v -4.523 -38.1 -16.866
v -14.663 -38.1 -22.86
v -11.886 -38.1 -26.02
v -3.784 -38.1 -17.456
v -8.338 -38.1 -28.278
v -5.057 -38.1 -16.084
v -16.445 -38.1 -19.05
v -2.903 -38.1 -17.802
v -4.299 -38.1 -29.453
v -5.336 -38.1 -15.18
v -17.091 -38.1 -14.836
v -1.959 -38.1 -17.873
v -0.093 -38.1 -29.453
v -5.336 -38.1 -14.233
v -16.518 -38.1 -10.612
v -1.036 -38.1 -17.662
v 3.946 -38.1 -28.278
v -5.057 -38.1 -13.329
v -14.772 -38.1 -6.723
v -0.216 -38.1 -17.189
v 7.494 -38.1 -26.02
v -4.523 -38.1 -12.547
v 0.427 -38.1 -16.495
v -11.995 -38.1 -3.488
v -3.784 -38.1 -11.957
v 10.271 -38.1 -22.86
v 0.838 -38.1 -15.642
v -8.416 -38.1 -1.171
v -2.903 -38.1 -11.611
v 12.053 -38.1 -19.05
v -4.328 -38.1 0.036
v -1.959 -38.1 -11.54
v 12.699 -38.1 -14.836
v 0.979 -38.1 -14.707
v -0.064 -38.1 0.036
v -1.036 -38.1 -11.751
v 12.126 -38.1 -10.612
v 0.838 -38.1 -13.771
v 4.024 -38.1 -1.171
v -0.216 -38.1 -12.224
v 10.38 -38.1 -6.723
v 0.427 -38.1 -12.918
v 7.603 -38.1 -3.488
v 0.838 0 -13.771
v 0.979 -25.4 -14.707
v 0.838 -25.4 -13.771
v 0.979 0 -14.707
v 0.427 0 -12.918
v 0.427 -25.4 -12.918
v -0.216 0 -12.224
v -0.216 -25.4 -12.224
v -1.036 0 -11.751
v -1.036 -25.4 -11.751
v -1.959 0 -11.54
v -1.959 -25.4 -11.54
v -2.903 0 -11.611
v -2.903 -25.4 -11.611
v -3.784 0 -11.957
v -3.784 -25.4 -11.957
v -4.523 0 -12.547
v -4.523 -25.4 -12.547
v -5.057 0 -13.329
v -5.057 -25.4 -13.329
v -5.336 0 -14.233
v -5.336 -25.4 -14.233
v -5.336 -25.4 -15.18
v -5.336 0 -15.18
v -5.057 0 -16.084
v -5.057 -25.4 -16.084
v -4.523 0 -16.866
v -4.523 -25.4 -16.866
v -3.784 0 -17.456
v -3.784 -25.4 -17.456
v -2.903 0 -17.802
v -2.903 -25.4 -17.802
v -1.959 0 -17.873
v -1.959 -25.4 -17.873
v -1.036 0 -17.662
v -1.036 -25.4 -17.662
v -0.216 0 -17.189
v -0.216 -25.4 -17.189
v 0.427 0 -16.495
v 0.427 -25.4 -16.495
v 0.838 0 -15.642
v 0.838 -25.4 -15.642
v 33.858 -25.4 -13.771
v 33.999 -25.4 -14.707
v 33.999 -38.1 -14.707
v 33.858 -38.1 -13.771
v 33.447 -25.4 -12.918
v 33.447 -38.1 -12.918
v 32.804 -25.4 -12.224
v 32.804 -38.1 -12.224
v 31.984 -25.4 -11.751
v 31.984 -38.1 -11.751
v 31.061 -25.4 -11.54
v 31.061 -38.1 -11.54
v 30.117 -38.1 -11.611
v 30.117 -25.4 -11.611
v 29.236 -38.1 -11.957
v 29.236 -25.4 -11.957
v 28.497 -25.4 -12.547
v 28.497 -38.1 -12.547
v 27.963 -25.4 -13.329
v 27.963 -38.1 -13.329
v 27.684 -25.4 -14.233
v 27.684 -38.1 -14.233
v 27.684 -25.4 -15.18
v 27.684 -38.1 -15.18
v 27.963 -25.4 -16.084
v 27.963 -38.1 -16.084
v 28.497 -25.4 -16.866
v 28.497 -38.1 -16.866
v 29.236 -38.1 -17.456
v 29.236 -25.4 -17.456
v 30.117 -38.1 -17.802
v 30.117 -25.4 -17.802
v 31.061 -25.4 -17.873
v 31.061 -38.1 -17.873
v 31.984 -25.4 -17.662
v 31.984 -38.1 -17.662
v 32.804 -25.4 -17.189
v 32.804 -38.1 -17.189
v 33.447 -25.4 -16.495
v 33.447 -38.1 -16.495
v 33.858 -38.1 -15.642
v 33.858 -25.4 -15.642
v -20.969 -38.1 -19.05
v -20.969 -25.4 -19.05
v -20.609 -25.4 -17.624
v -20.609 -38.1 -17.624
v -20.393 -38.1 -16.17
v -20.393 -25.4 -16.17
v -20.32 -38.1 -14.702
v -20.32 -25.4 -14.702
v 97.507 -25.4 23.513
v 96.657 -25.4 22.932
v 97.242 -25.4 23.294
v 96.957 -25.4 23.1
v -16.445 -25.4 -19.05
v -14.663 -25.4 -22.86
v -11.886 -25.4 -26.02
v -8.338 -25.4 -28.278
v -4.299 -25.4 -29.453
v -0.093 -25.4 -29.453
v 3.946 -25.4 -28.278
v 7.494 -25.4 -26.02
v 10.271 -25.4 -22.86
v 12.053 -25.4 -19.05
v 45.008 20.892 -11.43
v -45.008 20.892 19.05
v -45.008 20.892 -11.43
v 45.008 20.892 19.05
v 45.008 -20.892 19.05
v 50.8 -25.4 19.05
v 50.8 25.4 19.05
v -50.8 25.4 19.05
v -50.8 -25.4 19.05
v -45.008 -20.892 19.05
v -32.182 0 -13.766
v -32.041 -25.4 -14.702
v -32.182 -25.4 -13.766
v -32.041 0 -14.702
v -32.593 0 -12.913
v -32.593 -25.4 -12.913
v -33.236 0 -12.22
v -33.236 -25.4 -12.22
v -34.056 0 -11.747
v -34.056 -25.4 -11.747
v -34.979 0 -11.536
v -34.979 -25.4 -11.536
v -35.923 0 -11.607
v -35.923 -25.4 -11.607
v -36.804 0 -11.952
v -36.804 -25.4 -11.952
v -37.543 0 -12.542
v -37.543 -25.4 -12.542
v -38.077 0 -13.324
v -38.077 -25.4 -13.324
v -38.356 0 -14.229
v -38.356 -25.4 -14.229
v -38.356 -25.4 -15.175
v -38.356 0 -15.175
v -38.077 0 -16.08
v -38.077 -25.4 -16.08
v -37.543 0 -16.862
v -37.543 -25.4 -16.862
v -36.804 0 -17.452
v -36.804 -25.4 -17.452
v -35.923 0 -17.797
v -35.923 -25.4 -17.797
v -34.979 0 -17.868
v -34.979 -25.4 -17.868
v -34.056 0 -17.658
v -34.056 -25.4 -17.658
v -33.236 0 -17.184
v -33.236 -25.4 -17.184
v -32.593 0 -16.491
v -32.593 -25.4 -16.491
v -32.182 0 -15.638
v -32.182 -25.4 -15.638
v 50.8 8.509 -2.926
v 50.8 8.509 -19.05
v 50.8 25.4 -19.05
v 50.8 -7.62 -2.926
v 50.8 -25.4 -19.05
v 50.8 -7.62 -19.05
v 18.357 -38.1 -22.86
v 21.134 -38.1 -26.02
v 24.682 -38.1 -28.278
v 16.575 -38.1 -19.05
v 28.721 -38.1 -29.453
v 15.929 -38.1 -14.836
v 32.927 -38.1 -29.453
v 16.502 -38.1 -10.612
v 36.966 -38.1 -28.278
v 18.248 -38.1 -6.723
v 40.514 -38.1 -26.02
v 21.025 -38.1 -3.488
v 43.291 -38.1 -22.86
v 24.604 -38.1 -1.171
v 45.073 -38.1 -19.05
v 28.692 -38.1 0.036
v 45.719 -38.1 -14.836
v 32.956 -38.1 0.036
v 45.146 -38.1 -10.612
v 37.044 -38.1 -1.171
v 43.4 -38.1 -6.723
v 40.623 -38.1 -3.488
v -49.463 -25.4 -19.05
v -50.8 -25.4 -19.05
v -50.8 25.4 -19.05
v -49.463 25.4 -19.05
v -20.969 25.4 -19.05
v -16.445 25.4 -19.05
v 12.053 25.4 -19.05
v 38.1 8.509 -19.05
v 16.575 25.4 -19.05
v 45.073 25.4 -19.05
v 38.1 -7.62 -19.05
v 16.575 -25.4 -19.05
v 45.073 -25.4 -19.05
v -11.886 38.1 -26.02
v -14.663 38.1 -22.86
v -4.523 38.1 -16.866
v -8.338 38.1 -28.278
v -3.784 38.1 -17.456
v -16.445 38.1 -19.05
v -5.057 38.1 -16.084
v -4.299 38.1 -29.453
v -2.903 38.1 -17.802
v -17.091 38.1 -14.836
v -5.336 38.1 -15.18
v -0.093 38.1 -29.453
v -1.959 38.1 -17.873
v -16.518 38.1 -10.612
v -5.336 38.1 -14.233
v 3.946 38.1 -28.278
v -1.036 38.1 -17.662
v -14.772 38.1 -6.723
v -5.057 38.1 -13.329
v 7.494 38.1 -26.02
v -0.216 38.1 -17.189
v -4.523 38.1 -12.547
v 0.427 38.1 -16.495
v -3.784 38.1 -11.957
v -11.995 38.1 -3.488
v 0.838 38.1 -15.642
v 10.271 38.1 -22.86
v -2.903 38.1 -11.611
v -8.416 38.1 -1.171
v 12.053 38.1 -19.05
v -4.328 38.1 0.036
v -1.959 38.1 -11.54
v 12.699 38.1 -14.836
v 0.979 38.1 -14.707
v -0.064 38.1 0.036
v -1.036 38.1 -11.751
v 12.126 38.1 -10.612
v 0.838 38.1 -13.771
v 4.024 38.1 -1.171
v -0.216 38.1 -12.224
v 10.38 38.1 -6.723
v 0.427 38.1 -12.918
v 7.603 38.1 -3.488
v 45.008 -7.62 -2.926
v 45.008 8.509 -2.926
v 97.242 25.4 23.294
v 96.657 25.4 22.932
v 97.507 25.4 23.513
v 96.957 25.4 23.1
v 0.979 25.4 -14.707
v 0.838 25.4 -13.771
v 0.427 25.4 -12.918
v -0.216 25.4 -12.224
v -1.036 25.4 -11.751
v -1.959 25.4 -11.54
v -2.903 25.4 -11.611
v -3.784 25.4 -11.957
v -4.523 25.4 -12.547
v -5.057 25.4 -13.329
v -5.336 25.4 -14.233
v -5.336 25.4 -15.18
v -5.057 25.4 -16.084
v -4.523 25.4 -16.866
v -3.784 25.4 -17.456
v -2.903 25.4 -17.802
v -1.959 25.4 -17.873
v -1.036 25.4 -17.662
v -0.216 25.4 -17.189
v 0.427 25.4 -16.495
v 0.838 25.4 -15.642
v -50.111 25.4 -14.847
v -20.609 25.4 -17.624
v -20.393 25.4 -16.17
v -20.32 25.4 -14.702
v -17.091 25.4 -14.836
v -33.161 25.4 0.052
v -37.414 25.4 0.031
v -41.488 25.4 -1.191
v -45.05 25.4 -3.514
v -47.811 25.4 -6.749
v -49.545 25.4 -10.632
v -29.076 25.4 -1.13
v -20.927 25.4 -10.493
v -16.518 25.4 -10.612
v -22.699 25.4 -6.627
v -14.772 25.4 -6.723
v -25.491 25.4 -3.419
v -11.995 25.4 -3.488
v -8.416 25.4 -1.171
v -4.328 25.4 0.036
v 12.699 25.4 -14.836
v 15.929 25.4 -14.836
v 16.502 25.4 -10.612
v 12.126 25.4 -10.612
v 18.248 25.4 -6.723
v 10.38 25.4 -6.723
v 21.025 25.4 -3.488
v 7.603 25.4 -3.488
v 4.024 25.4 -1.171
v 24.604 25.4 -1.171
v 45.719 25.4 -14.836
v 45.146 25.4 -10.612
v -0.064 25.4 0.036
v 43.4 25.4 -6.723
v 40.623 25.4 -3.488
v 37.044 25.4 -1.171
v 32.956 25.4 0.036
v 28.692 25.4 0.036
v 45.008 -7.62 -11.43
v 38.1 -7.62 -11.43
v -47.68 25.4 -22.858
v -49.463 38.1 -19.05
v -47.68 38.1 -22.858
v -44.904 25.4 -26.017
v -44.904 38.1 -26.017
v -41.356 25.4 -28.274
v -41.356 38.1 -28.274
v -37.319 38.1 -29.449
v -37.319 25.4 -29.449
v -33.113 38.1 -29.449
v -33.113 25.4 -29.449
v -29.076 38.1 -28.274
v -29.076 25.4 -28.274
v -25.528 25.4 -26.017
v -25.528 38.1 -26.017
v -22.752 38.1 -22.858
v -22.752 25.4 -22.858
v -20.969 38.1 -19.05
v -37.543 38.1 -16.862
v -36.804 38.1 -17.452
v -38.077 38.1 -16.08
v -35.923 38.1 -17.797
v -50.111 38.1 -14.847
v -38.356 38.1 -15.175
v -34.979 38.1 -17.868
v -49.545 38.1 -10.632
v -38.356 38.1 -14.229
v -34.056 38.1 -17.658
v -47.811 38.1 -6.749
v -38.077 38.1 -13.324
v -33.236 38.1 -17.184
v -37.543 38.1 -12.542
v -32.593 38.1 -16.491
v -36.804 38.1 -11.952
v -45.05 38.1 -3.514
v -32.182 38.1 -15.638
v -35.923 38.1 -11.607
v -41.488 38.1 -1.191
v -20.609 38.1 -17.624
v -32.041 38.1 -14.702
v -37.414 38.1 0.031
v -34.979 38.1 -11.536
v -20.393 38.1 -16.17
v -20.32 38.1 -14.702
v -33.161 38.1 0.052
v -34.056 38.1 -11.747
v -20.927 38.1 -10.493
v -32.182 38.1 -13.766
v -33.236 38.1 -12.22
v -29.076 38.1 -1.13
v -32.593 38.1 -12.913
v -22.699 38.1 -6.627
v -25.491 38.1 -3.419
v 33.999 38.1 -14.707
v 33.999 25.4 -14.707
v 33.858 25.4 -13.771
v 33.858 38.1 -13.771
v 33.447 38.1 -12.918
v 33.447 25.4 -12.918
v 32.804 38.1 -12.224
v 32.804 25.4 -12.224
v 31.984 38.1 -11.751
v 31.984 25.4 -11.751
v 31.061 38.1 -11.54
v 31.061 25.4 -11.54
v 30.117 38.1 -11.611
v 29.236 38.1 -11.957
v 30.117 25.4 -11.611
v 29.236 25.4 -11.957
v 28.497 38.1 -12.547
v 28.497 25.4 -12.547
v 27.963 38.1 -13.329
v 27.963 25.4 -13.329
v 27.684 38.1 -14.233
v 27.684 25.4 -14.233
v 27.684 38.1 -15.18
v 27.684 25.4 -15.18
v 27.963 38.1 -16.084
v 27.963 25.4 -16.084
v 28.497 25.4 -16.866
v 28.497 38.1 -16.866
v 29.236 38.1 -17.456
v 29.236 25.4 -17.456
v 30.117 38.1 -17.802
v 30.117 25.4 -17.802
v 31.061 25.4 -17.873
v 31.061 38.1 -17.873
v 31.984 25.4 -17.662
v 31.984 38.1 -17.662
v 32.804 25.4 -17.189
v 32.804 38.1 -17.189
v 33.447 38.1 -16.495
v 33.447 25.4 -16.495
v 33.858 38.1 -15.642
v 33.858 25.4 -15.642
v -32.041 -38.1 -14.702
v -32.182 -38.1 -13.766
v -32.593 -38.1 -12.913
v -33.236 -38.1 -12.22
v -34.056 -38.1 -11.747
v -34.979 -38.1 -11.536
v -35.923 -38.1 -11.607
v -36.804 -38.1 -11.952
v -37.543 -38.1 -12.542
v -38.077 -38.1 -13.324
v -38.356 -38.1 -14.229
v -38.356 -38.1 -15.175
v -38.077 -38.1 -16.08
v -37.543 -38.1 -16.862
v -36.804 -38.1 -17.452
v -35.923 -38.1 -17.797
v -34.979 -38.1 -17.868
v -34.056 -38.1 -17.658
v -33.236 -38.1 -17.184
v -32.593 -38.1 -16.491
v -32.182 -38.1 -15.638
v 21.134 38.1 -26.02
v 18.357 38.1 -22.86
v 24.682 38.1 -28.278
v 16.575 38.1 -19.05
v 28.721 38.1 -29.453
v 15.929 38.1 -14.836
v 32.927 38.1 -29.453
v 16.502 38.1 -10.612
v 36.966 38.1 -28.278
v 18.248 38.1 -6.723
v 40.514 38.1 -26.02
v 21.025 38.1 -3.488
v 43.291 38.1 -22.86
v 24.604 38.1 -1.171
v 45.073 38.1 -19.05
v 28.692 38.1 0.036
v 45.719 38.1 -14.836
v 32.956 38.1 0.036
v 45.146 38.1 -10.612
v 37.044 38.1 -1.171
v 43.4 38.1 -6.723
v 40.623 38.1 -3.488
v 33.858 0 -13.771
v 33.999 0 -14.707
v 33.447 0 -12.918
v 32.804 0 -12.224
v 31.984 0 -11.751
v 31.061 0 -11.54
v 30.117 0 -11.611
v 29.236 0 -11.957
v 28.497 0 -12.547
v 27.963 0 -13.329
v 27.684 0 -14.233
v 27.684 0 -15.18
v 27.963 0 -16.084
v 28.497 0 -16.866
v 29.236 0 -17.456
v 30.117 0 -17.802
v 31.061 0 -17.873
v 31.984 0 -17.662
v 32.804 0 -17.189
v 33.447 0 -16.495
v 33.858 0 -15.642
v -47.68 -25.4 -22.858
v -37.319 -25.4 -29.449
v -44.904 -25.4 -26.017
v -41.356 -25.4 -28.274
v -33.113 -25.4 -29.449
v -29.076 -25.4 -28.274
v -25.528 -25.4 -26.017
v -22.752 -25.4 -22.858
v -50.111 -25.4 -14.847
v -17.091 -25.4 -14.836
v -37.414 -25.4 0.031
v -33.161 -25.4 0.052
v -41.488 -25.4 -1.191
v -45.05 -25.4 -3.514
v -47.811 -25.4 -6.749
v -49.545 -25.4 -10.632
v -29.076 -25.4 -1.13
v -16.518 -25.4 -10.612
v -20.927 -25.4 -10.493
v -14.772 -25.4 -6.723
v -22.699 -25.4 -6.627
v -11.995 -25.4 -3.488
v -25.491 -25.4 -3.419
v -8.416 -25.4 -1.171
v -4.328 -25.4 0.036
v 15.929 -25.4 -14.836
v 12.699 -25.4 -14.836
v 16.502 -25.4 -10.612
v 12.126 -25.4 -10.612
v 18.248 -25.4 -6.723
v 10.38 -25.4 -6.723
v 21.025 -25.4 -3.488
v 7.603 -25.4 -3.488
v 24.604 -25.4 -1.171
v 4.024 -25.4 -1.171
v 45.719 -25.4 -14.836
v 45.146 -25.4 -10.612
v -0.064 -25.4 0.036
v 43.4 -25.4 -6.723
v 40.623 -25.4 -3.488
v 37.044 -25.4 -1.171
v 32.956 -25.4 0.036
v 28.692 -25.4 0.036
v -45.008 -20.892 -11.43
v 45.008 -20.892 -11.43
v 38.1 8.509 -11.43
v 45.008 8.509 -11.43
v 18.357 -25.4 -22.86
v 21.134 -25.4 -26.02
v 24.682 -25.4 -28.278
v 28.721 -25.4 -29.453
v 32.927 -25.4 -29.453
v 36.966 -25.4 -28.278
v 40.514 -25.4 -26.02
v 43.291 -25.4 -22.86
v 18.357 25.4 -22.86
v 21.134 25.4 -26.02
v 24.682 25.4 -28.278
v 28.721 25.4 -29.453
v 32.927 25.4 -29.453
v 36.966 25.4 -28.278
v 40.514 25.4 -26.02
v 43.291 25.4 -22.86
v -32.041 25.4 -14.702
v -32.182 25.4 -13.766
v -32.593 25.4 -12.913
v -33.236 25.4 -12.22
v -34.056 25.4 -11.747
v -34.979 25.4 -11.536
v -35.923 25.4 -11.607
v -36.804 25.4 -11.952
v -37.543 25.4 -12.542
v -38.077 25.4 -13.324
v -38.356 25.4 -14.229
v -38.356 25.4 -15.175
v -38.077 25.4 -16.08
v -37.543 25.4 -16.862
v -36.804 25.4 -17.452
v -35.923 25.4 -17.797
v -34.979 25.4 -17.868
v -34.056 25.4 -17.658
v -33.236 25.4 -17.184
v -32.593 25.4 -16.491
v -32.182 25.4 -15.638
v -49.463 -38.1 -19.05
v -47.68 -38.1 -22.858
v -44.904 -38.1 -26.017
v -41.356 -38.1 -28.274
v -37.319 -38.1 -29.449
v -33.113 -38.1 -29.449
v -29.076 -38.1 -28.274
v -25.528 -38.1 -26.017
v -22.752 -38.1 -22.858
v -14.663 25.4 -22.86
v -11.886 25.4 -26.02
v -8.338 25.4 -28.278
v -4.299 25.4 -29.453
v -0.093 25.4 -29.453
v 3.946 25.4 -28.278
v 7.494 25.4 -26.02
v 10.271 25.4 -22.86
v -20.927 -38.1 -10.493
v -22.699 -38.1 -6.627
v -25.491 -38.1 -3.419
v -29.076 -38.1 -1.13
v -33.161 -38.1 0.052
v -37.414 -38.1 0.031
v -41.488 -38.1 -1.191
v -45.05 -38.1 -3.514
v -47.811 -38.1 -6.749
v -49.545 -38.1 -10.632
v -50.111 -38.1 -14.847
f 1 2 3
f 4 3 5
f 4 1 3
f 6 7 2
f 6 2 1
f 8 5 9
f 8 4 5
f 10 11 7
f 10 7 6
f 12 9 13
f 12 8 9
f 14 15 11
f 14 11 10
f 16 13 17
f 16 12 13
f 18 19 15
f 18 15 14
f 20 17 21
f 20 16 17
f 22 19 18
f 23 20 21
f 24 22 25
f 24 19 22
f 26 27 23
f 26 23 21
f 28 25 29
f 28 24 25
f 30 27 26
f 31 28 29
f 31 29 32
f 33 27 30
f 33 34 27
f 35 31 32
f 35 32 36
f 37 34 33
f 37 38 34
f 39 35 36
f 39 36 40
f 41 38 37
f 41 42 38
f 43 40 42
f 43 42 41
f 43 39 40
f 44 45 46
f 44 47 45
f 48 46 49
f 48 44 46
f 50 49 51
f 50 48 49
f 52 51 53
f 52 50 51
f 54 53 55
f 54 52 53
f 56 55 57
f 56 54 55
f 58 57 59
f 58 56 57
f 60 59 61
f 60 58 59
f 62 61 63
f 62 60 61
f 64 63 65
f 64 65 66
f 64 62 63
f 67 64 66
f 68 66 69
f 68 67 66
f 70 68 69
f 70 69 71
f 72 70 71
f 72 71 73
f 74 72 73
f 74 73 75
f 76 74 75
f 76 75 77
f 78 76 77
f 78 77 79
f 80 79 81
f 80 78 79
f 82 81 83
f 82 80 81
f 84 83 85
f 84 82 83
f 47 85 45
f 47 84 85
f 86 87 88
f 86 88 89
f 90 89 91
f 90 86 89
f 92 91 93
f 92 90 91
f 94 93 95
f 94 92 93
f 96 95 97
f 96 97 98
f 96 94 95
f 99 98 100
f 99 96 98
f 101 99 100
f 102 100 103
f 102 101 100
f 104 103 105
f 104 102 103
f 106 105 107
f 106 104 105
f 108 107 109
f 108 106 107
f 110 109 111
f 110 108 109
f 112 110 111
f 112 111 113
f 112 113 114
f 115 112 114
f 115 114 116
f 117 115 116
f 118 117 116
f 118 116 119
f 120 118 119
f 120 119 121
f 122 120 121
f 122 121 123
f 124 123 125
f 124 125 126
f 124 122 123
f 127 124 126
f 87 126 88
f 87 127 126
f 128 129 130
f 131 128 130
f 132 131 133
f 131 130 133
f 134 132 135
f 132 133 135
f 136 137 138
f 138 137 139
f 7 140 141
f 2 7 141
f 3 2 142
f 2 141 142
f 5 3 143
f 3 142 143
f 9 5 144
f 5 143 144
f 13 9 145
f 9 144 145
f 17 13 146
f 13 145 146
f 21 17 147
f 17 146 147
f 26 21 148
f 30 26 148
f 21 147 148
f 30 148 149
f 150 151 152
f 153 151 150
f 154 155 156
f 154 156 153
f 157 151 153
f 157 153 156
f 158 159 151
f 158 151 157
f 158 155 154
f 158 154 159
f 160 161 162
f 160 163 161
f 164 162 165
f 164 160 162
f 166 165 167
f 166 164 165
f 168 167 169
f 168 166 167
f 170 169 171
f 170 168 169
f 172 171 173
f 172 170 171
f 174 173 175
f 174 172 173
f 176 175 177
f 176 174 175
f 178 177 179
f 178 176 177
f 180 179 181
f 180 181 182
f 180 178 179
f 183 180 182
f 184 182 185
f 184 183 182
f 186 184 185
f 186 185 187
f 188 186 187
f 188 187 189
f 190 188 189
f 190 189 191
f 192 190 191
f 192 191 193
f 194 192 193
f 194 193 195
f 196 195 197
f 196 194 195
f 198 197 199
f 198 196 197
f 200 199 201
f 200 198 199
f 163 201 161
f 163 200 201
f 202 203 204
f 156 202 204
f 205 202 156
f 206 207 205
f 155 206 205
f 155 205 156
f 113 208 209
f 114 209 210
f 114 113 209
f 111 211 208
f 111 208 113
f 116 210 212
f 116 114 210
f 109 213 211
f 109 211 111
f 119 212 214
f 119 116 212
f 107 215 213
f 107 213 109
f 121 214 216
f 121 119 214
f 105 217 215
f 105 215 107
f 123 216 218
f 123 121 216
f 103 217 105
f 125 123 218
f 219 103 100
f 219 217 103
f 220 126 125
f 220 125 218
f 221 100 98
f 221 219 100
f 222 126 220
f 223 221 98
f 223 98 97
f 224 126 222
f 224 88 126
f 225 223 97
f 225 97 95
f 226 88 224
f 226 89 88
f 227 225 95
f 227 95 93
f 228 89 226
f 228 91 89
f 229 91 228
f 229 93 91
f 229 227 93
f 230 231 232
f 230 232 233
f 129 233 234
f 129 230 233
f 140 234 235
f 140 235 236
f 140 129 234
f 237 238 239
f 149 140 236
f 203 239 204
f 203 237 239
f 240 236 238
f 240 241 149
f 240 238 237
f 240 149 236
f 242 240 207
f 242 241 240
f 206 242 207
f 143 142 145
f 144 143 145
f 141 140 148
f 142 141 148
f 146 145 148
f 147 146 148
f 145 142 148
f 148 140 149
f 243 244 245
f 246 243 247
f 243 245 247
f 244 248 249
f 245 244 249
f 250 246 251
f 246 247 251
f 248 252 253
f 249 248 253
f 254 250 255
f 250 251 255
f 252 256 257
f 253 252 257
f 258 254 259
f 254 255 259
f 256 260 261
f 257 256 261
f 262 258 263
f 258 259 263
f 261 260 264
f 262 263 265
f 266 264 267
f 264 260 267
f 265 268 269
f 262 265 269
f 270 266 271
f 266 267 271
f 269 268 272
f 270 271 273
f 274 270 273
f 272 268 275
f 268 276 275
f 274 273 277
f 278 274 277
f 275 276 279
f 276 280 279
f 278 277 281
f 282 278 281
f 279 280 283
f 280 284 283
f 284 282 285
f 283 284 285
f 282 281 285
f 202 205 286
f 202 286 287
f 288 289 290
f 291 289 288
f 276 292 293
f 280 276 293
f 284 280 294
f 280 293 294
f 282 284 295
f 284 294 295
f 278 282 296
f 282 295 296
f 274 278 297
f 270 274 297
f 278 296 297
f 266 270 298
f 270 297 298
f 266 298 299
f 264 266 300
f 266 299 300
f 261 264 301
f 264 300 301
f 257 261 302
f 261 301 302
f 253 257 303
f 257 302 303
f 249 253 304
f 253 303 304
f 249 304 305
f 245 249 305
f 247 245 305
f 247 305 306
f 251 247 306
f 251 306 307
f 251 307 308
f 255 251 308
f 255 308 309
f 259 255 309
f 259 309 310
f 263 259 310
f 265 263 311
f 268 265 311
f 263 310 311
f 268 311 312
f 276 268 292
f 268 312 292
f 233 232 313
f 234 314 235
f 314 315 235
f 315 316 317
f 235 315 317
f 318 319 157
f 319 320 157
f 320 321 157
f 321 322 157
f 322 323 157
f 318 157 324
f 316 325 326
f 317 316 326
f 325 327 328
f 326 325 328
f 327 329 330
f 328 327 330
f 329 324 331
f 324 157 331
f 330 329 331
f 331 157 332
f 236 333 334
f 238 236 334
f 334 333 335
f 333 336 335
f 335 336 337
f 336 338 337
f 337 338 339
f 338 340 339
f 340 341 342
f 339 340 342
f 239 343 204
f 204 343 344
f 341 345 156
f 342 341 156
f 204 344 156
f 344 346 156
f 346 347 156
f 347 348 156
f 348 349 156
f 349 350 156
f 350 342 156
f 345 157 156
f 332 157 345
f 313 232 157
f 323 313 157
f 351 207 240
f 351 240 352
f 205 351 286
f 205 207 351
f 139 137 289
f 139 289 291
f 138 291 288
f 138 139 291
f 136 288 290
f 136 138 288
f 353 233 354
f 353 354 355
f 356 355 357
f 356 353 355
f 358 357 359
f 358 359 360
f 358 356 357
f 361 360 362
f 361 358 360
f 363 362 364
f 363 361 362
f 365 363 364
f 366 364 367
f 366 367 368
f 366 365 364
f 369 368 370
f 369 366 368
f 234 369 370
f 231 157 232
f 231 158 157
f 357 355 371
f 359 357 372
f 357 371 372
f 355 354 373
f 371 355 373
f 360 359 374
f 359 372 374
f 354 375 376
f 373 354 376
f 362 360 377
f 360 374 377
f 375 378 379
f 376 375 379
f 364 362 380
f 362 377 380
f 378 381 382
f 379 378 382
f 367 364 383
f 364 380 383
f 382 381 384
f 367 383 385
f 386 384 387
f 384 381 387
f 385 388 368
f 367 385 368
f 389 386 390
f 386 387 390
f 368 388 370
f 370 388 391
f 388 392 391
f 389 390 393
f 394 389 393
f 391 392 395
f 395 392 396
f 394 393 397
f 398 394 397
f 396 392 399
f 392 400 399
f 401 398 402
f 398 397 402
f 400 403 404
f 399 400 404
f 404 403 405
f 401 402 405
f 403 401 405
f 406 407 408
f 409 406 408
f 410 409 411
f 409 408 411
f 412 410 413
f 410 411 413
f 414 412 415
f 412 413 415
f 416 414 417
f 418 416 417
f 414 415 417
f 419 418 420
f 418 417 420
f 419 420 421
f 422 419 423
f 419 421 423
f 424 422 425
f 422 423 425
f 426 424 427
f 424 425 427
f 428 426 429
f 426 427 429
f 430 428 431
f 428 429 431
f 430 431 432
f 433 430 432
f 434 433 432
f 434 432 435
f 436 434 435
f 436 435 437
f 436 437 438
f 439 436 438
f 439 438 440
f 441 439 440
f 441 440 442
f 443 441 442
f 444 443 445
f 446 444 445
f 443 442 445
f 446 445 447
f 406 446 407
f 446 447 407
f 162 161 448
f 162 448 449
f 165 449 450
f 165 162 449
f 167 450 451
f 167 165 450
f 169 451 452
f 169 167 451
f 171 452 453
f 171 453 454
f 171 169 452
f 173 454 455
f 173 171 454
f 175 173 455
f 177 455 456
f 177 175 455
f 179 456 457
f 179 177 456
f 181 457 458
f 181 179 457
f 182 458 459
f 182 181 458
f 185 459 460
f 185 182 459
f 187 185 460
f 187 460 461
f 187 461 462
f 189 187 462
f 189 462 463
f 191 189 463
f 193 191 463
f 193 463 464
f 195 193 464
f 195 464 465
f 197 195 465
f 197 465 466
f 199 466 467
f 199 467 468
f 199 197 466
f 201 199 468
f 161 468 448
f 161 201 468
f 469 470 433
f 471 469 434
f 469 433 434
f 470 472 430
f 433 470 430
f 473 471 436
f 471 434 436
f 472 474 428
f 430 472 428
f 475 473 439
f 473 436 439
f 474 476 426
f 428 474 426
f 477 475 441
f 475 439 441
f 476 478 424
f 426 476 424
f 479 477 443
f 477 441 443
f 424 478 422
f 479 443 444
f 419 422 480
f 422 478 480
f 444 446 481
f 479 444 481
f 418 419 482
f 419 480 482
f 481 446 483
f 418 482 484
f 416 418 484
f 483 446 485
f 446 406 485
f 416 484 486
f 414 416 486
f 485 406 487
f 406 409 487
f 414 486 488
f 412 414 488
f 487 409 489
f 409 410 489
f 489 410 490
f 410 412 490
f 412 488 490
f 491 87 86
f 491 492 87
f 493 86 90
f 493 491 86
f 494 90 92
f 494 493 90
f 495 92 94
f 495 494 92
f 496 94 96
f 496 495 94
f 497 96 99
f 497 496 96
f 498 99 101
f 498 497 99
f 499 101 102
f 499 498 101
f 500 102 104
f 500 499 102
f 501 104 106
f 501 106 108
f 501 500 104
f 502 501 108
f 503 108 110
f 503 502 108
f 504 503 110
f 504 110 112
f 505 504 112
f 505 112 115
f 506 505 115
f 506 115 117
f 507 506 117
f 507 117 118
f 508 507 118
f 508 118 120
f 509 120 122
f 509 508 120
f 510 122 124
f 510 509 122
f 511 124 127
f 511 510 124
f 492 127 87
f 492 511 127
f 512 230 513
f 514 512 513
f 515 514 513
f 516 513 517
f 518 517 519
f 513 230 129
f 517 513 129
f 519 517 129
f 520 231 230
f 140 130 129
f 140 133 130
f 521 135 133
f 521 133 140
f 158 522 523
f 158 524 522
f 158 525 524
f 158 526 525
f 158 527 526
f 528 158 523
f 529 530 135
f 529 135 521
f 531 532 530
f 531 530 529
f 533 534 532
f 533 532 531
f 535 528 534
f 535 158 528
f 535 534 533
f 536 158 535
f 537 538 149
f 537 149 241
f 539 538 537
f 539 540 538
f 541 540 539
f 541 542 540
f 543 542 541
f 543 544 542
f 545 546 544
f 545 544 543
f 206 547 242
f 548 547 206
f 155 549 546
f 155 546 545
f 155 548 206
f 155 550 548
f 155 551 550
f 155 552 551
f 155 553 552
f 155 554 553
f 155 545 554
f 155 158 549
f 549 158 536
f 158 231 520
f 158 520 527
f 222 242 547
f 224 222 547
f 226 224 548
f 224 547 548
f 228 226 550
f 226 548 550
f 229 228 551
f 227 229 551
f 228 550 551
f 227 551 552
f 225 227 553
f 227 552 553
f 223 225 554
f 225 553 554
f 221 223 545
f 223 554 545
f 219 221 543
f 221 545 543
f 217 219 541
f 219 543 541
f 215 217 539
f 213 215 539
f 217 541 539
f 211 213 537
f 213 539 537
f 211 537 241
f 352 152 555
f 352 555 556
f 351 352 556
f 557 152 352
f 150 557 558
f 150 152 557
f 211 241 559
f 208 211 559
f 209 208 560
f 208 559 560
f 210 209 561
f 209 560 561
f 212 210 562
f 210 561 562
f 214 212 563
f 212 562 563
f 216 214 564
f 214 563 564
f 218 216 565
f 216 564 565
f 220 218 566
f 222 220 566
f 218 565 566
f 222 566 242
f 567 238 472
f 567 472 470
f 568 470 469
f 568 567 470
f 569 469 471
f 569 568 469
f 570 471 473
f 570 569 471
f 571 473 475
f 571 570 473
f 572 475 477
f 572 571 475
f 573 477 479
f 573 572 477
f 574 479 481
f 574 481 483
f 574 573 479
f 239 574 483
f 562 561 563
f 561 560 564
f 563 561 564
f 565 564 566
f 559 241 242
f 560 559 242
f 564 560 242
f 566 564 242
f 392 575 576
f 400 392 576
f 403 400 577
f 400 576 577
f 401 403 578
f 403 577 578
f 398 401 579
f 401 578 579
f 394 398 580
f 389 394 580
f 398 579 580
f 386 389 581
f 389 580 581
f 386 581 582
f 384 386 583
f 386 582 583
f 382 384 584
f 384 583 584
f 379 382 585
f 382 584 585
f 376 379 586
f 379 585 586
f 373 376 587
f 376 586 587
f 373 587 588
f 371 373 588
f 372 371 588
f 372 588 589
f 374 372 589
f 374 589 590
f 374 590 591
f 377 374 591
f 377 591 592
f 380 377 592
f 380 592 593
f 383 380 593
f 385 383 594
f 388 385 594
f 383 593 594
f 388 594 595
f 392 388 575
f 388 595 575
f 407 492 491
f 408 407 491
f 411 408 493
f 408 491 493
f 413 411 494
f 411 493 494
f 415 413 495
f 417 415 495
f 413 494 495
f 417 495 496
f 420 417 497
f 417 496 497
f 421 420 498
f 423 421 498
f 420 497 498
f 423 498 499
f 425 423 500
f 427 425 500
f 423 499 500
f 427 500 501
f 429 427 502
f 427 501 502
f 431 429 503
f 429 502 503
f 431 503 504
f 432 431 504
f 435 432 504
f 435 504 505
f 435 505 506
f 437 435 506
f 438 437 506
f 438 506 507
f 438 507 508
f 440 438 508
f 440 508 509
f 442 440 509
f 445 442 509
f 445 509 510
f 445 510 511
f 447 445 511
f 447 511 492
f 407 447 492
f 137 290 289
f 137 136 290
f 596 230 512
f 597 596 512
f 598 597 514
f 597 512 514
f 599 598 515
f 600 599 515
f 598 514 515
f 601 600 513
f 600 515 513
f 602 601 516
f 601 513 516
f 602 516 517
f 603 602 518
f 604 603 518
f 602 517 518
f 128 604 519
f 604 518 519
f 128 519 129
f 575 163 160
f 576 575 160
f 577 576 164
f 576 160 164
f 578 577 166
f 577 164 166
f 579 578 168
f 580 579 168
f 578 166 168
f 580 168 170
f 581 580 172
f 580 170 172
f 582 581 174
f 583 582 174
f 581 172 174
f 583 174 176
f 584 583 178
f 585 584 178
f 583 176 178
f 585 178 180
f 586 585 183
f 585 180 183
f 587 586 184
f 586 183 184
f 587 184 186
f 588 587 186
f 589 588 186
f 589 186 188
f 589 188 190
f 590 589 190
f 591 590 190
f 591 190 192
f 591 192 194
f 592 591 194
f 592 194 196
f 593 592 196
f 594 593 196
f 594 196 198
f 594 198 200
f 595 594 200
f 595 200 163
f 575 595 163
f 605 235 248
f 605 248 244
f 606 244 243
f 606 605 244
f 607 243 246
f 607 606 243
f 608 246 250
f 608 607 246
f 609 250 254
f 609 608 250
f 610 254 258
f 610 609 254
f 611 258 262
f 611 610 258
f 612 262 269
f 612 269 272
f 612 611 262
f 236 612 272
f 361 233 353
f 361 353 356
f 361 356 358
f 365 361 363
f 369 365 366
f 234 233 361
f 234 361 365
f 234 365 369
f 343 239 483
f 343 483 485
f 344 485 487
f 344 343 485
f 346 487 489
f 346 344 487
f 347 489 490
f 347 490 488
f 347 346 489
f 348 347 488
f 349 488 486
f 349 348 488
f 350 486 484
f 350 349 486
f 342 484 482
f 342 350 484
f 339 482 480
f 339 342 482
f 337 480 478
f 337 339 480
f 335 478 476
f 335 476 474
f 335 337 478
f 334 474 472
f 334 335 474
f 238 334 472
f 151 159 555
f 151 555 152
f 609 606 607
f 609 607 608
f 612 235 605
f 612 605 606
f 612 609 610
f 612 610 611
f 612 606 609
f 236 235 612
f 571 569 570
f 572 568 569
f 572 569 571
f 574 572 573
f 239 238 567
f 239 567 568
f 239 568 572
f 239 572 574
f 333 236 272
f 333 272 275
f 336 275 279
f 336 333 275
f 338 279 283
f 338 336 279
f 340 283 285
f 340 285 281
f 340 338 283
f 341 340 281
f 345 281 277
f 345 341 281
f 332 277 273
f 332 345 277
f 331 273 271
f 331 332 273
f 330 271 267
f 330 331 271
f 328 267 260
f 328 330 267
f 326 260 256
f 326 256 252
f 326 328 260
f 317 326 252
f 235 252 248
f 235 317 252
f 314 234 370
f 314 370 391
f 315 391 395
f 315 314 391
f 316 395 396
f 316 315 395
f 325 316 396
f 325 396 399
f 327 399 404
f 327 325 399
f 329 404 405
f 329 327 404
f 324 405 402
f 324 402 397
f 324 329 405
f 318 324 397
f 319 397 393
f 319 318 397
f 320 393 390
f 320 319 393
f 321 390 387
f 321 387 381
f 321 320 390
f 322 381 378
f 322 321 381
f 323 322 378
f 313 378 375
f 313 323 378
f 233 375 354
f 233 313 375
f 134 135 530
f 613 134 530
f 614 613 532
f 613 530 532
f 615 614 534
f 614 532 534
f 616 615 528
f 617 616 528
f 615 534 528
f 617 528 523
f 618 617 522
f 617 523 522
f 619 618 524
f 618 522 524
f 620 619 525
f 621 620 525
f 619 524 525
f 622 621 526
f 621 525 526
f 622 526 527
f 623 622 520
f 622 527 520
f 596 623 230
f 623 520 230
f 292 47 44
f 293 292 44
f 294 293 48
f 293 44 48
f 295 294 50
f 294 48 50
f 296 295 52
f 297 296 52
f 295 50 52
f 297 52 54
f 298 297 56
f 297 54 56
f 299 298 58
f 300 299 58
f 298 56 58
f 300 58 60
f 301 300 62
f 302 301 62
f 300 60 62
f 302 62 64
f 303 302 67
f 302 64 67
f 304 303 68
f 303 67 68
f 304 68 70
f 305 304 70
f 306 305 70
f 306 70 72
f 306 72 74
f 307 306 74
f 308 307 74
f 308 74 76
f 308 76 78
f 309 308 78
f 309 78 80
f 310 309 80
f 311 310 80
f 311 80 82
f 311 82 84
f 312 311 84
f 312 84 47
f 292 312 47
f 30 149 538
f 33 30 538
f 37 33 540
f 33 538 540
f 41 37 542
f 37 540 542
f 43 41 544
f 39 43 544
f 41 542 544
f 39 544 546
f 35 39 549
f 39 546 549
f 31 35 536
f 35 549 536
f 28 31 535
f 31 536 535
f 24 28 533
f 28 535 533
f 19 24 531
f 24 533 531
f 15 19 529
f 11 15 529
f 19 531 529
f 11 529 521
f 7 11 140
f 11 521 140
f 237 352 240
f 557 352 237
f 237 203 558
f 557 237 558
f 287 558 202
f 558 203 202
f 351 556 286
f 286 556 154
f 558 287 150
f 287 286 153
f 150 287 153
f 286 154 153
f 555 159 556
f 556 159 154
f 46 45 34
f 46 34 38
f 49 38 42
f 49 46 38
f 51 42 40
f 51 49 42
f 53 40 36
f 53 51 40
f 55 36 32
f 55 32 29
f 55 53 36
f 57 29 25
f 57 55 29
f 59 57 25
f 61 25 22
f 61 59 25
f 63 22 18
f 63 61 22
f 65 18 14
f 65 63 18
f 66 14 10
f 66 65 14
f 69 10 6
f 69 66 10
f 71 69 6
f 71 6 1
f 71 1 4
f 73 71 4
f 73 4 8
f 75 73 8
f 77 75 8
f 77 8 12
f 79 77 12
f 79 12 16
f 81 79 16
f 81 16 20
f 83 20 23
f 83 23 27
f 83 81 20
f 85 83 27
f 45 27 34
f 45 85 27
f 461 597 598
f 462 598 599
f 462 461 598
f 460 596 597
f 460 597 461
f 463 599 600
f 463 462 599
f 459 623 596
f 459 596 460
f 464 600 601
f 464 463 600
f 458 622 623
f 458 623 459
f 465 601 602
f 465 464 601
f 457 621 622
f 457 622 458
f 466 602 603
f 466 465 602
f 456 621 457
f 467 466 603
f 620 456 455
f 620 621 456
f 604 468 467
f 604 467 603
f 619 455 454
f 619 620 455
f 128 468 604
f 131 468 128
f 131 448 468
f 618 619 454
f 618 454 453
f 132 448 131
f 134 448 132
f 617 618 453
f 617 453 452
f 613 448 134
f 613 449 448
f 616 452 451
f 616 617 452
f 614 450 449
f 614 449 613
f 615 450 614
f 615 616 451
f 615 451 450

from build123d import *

# Parameters (mm, degrees)
F1_DEPTH  = 25.4
F2_R      = 3.175
F3_DEPTH  = 12.7
F5_W      = 90.0154933333
F5_H      = 41.784722358
F6_DEPTH  = 30.48
F7_W      = 16.129
F7_H      = 16.1236341841
F8_DEPTH  = 12.7
F9_DEPTH  = 25.4
F10_DEPTH = 101.6
F11_DEPTH = 12.7


# Not quite as in the source:
# - a feature names something its author has since deleted; it is built from what else it names


with BuildPart() as f1:
    # F0 (on Front) → F1 (new body, symmetric)
    with BuildSketch(Plane.XZ):
        with BuildLine():
            Line((97.5067541003, 23.5131774098), (96.6568392289, 22.9320458975))
            ThreePointArc((96.6568392289, 22.9320458975), (97.1017650033, 23.1934076134), (97.5067541003, 23.5131774098))
        make_face()
    extrude(amount=F1_DEPTH, both=True)


with BuildPart() as f1b:
    # F0 (on Front) → F1, piece 2 (new body, symmetric)
    with BuildSketch(Plane.XZ):
        Polygon((-50.8, -19.05), (50.8, -19.05), (50.8, -8.4226876497), (50.8, 0), (50.8, 19.05), (-50.8, 19.05), align=None)
    extrude(amount=F1_DEPTH, both=True)



with BuildPart() as f3:
    # F2 (on face) → F3 (new body)
    with BuildSketch(Plane.XZ.offset(25.4)):
        with BuildLine():
            Line((45.0727086193, -19.05), (16.5752838461, -19.05))
            ThreePointArc((16.5752838461, -19.05), (30.8239962327, -29.6026037673), (45.0727086193, -19.05))
        make_face()
        with BuildLine():
            ThreePointArc((45.72, -14.7066), (28.628312416, 0.0266922598), (16.5752838461, -19.05))
            Line((16.5752838461, -19.05), (45.0727086193, -19.05))
            ThreePointArc((45.0727086193, -19.05), (45.5572884925, -16.9022838167), (45.72, -14.7066))
        make_face()
        with Locations((30.8239962327, -14.7066)):
            Circle(F2_R, mode=Mode.SUBTRACT)
    extrude(amount=F3_DEPTH)


with BuildPart() as f3b:
    # F2 (on face) → F3, piece 2 (new body)
    with BuildSketch(Plane.XZ.offset(25.4)):
        with BuildLine():
            ThreePointArc((12.7, -14.7066), (-4.391687584, 0.0266922598), (-16.4447161539, -19.05))
            Line((-16.4447161539, -19.05), (12.0527086193, -19.05))
            ThreePointArc((12.0527086193, -19.05), (12.5372884925, -16.9022838167), (12.7, -14.7066))
        make_face()
        with Locations((-2.1960037673, -14.7066)):
            Circle(F2_R, mode=Mode.SUBTRACT)
        with BuildLine():
            Line((12.0527086193, -19.05), (-16.4447161539, -19.05))
            ThreePointArc((-16.4447161539, -19.05), (-2.1960037673, -29.6026037673), (12.0527086193, -19.05))
        make_face()
    extrude(amount=F3_DEPTH)


with BuildPart() as f3c:
    # F2 (on face) → F3, piece 3 (new body)
    with BuildSketch(Plane.XZ.offset(25.4)):
        with BuildLine():
            ThreePointArc((-20.9686848198, -19.05), (-20.4830637187, -16.9000772846), (-20.32, -14.7020313889))
            ThreePointArc((-20.32, -14.7020313889), (-37.414049663, 0.0309086597), (-49.4633227148, -19.05))
            Line((-49.4633227148, -19.05), (-20.9686848198, -19.05))
        make_face()
        with Locations((-35.2160037673, -14.7020313889)):
            Circle(F2_R, mode=Mode.SUBTRACT)
        with BuildLine():
            Line((-20.9686848198, -19.05), (-49.4633227148, -19.05))
            ThreePointArc((-49.4633227148, -19.05), (-35.2160037673, -29.5980351562), (-20.9686848198, -19.05))
        make_face()
    extrude(amount=F3_DEPTH)


with BuildPart() as f1b_1:
    add(f1b.part)

    add(f3.part)  # F4 merges F3

    add(f3b.part)  # F4 merges F3b

    add(f3c.part)  # F4 merges F3c
    # F4: F3, F3b, F3c across plane
    add(f3.part.mirror(Plane.XZ))
    add(f3b.part.mirror(Plane.XZ))
    add(f3c.part.mirror(Plane.XZ))

    # F5 (on face) → F6 (cut)
    with BuildSketch(Plane.XY.offset(19.05)):
        Rectangle(F5_W, F5_H)
    extrude(amount=-F6_DEPTH, mode=Mode.SUBTRACT)

    # F2 (on face) → F9 (cut)
    with BuildSketch(Plane.XZ.offset(25.4)):
        with Locations((-35.2160037673, -14.7020313889)):
            Circle(F2_R)
        with Locations((-2.1960037673, -14.7066)):
            Circle(F2_R)
        with Locations((30.8239962327, -14.7066)):
            Circle(F2_R)
    extrude(amount=-F9_DEPTH, mode=Mode.SUBTRACT)

    # F2 (on face) → F10 (cut)
    with BuildSketch(Plane.XZ.offset(25.4)):
        with Locations((-2.1960037673, -14.7066)):
            Circle(F2_R)
        with Locations((-35.2160037673, -14.7020313889)):
            Circle(F2_R)
        with Locations((30.8239962327, -14.7066)):
            Circle(F2_R)
    extrude(amount=-F10_DEPTH, mode=Mode.SUBTRACT)


with BuildPart() as f8:
    # F7 (on face) → F8 (new body)
    with BuildSketch(Plane.YZ.offset(50.8)):
        with Locations((0.4445, -10.988182908)):
            Rectangle(F7_W, F7_H)
    extrude(amount=-F8_DEPTH)


with BuildPart() as f11_tool:
    # F7 (on face) → F11 (new body)
    with BuildSketch(Plane.YZ.offset(50.8)):
        with Locations((0.4445, -10.988182908)):
            Rectangle(F7_W, F7_H)
    extrude(amount=-F11_DEPTH)


with BuildPart() as f1b_2:
    add(f1b_1.part)

    # F11: cut by f11_tool
    add(f11_tool.part, mode=Mode.SUBTRACT)


with BuildPart() as f8_1:
    add(f8.part)

    # F11: cut by f11_tool
    add(f11_tool.part, mode=Mode.SUBTRACT)


solid = Compound([f1.part, f1b_2.part])
